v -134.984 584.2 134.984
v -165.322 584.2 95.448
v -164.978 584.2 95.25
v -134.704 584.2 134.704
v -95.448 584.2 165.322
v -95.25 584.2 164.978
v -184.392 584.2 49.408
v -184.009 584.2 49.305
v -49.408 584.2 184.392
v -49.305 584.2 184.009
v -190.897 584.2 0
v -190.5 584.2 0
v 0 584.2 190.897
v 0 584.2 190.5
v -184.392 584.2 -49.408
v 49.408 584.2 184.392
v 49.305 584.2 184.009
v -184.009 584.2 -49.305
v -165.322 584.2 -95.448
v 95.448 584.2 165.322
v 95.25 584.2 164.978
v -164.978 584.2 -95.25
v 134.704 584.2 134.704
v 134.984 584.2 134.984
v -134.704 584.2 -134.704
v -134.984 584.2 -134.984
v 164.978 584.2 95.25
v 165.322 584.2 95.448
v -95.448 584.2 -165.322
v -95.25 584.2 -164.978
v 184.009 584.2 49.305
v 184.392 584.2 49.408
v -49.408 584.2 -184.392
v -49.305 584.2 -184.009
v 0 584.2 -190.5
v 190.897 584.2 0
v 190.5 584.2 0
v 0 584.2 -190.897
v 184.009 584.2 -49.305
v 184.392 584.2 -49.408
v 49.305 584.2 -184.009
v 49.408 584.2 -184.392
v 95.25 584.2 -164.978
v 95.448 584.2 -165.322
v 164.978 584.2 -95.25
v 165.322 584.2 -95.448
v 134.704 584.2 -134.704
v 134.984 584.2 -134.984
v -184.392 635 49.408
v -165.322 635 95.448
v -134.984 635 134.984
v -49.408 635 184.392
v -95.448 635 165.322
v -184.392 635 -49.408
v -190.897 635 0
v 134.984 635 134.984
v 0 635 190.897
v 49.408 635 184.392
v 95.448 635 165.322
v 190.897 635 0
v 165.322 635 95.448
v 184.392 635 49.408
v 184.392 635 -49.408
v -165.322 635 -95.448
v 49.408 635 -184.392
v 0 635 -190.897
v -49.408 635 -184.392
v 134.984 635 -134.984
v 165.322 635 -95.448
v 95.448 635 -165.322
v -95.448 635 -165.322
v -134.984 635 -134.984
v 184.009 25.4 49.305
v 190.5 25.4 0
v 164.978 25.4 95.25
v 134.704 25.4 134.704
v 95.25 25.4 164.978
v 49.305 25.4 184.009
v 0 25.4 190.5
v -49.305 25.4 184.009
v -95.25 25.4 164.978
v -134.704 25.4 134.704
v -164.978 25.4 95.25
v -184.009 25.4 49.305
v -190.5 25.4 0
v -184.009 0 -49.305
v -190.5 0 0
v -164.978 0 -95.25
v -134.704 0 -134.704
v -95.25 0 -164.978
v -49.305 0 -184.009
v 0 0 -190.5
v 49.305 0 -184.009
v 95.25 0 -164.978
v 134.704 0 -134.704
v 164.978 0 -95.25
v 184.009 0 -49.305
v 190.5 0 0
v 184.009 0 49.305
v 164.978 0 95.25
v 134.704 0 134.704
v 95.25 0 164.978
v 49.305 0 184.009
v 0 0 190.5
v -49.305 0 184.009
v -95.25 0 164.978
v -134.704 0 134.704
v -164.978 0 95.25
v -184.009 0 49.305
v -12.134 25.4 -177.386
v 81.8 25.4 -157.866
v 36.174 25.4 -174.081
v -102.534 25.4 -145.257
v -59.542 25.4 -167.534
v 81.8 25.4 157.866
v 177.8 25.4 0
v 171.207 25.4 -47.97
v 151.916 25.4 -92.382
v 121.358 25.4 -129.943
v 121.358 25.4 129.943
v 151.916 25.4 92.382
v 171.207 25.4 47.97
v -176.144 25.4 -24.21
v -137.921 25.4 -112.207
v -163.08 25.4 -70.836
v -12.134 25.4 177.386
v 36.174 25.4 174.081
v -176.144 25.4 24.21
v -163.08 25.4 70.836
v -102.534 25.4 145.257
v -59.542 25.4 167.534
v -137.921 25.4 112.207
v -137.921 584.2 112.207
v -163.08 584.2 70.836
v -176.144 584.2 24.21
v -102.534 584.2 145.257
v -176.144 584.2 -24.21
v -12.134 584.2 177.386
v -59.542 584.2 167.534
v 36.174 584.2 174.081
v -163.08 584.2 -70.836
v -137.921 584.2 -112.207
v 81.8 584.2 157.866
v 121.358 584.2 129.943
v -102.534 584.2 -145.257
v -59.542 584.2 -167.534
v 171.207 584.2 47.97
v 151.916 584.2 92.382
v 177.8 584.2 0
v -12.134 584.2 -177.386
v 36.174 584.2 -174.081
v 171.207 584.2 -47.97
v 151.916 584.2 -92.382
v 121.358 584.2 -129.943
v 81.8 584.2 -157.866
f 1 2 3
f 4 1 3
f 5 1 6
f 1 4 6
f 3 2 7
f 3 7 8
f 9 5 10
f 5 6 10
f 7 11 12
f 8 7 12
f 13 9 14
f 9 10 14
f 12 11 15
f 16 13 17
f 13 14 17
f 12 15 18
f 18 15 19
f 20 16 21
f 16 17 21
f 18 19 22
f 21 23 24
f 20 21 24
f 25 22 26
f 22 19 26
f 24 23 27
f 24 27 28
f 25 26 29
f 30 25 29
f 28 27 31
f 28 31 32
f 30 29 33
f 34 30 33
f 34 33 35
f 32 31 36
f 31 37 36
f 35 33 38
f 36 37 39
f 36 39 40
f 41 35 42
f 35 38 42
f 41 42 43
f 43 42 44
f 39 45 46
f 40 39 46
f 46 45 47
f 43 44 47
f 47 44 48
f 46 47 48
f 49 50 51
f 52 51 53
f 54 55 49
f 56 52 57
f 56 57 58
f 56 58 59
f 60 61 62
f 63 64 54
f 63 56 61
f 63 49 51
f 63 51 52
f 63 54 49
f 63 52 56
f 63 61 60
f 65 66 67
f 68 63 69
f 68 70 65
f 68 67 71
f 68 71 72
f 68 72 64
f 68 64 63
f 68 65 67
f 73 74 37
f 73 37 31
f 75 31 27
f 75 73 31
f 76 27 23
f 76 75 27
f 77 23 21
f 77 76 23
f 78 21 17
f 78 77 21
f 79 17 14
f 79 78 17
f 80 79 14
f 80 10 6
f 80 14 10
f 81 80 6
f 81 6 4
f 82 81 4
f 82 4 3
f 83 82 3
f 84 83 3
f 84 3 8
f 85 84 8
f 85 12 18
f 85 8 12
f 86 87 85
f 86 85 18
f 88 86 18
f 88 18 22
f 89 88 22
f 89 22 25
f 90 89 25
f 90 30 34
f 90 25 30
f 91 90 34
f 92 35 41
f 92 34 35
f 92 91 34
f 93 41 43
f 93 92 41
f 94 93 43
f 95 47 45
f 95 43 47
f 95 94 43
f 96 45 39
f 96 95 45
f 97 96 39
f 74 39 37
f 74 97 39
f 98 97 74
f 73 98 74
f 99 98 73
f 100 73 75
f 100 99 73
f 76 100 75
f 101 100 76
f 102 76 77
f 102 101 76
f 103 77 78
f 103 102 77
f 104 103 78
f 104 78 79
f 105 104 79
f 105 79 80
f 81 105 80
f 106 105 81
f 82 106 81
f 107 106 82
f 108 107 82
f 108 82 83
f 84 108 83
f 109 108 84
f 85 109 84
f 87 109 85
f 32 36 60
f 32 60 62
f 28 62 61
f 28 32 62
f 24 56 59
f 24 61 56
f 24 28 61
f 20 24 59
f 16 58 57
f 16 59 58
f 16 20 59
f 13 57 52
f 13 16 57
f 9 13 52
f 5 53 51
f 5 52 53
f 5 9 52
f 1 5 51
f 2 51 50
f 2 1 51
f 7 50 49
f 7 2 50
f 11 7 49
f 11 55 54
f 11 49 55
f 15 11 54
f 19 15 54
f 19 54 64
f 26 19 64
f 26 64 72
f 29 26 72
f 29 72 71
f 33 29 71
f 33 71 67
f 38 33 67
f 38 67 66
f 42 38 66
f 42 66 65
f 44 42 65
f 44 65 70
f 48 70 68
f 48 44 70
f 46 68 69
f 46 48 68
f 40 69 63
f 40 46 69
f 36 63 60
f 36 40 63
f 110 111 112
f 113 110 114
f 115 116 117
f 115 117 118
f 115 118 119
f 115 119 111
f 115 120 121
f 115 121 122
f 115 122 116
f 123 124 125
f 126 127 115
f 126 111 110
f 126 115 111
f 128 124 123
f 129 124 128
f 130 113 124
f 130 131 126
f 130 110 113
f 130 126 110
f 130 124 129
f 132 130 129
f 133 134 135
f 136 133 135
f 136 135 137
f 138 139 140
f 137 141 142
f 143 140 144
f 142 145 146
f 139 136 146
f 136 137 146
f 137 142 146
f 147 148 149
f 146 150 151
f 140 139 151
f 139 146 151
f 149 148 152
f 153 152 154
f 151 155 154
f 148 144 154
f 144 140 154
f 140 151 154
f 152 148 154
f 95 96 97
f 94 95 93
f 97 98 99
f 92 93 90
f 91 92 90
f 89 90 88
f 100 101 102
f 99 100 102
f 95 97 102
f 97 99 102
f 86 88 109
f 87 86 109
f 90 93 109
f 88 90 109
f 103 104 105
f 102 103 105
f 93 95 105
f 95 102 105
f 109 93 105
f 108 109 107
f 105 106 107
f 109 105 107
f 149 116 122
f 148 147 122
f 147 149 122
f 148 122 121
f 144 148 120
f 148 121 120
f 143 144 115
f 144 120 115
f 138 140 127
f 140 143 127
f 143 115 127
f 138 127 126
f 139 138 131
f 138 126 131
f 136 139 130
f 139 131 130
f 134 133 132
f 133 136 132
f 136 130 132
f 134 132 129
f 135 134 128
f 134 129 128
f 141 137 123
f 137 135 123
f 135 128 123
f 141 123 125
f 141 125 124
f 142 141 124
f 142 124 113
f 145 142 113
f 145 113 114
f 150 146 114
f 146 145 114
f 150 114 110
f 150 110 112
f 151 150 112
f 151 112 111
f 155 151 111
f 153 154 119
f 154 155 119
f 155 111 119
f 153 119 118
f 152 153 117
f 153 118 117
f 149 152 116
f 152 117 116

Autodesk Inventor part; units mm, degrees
ref_plane "YZ Plane" through (0, 0, 0) normal (1, 0, 0) x (0, 1, 0)
ref_plane "XZ Plane" through (0, 0, 0) normal (0, 1, 0) x (-1, 0, 0)
ref_plane "XY Plane" through (0, 0, 0) normal (0, 0, 1) x (1, 0, 0)
sketch "Sketch1" plane through (0, 0, 0) normal (0, 1, 0) x (-1, 0, 0)
  circle A0 centre (0, 0) radius 190.5
  dimension "d0" = 381
extrude "Extrusion1" add sketch "Sketch1" along normal blind 25.4
sketch "Sketch2" plane through (0, 25.4, 0) normal (0, 1, 0) x (1, 0, 0)
  circle A0 centre (0, 0) radius 177.8
  circle A1 centre (0, 0) radius 190.5 projected
  dimension "d3" = 355.6
extrude "Extrusion2" add sketch "Sketch2" along normal blind 558.8
sketch "Sketch3" plane through (0, 584.2, 0) normal (0, 1, 0) x (1, 0, 0)
  circle A0 centre (0, 0) radius 190.8969
  dimension "d6" = 381.7937
extrude "Extrusion3" add sketch "Sketch3" along normal blind 50.8
ref_plane "Work Plane2" through (190.5, 0, 0) normal (1, 0, 0) x (0, 1, 0)
ref_plane "Work Plane1" through (228.6, -12.7, -4375.1201) normal (1, 0, 0) x (0, 1, 0)
ref_plane "Work Plane4" through (0, 0, 190.5) normal (0, 0, 1) x (1, 0, 0)
ref_plane "Work Plane3" through (-228.6, -12.7, 203.2) normal (0, 0, 1) x (1, 0, 0)
properties part number "Tun-Placeholder"
